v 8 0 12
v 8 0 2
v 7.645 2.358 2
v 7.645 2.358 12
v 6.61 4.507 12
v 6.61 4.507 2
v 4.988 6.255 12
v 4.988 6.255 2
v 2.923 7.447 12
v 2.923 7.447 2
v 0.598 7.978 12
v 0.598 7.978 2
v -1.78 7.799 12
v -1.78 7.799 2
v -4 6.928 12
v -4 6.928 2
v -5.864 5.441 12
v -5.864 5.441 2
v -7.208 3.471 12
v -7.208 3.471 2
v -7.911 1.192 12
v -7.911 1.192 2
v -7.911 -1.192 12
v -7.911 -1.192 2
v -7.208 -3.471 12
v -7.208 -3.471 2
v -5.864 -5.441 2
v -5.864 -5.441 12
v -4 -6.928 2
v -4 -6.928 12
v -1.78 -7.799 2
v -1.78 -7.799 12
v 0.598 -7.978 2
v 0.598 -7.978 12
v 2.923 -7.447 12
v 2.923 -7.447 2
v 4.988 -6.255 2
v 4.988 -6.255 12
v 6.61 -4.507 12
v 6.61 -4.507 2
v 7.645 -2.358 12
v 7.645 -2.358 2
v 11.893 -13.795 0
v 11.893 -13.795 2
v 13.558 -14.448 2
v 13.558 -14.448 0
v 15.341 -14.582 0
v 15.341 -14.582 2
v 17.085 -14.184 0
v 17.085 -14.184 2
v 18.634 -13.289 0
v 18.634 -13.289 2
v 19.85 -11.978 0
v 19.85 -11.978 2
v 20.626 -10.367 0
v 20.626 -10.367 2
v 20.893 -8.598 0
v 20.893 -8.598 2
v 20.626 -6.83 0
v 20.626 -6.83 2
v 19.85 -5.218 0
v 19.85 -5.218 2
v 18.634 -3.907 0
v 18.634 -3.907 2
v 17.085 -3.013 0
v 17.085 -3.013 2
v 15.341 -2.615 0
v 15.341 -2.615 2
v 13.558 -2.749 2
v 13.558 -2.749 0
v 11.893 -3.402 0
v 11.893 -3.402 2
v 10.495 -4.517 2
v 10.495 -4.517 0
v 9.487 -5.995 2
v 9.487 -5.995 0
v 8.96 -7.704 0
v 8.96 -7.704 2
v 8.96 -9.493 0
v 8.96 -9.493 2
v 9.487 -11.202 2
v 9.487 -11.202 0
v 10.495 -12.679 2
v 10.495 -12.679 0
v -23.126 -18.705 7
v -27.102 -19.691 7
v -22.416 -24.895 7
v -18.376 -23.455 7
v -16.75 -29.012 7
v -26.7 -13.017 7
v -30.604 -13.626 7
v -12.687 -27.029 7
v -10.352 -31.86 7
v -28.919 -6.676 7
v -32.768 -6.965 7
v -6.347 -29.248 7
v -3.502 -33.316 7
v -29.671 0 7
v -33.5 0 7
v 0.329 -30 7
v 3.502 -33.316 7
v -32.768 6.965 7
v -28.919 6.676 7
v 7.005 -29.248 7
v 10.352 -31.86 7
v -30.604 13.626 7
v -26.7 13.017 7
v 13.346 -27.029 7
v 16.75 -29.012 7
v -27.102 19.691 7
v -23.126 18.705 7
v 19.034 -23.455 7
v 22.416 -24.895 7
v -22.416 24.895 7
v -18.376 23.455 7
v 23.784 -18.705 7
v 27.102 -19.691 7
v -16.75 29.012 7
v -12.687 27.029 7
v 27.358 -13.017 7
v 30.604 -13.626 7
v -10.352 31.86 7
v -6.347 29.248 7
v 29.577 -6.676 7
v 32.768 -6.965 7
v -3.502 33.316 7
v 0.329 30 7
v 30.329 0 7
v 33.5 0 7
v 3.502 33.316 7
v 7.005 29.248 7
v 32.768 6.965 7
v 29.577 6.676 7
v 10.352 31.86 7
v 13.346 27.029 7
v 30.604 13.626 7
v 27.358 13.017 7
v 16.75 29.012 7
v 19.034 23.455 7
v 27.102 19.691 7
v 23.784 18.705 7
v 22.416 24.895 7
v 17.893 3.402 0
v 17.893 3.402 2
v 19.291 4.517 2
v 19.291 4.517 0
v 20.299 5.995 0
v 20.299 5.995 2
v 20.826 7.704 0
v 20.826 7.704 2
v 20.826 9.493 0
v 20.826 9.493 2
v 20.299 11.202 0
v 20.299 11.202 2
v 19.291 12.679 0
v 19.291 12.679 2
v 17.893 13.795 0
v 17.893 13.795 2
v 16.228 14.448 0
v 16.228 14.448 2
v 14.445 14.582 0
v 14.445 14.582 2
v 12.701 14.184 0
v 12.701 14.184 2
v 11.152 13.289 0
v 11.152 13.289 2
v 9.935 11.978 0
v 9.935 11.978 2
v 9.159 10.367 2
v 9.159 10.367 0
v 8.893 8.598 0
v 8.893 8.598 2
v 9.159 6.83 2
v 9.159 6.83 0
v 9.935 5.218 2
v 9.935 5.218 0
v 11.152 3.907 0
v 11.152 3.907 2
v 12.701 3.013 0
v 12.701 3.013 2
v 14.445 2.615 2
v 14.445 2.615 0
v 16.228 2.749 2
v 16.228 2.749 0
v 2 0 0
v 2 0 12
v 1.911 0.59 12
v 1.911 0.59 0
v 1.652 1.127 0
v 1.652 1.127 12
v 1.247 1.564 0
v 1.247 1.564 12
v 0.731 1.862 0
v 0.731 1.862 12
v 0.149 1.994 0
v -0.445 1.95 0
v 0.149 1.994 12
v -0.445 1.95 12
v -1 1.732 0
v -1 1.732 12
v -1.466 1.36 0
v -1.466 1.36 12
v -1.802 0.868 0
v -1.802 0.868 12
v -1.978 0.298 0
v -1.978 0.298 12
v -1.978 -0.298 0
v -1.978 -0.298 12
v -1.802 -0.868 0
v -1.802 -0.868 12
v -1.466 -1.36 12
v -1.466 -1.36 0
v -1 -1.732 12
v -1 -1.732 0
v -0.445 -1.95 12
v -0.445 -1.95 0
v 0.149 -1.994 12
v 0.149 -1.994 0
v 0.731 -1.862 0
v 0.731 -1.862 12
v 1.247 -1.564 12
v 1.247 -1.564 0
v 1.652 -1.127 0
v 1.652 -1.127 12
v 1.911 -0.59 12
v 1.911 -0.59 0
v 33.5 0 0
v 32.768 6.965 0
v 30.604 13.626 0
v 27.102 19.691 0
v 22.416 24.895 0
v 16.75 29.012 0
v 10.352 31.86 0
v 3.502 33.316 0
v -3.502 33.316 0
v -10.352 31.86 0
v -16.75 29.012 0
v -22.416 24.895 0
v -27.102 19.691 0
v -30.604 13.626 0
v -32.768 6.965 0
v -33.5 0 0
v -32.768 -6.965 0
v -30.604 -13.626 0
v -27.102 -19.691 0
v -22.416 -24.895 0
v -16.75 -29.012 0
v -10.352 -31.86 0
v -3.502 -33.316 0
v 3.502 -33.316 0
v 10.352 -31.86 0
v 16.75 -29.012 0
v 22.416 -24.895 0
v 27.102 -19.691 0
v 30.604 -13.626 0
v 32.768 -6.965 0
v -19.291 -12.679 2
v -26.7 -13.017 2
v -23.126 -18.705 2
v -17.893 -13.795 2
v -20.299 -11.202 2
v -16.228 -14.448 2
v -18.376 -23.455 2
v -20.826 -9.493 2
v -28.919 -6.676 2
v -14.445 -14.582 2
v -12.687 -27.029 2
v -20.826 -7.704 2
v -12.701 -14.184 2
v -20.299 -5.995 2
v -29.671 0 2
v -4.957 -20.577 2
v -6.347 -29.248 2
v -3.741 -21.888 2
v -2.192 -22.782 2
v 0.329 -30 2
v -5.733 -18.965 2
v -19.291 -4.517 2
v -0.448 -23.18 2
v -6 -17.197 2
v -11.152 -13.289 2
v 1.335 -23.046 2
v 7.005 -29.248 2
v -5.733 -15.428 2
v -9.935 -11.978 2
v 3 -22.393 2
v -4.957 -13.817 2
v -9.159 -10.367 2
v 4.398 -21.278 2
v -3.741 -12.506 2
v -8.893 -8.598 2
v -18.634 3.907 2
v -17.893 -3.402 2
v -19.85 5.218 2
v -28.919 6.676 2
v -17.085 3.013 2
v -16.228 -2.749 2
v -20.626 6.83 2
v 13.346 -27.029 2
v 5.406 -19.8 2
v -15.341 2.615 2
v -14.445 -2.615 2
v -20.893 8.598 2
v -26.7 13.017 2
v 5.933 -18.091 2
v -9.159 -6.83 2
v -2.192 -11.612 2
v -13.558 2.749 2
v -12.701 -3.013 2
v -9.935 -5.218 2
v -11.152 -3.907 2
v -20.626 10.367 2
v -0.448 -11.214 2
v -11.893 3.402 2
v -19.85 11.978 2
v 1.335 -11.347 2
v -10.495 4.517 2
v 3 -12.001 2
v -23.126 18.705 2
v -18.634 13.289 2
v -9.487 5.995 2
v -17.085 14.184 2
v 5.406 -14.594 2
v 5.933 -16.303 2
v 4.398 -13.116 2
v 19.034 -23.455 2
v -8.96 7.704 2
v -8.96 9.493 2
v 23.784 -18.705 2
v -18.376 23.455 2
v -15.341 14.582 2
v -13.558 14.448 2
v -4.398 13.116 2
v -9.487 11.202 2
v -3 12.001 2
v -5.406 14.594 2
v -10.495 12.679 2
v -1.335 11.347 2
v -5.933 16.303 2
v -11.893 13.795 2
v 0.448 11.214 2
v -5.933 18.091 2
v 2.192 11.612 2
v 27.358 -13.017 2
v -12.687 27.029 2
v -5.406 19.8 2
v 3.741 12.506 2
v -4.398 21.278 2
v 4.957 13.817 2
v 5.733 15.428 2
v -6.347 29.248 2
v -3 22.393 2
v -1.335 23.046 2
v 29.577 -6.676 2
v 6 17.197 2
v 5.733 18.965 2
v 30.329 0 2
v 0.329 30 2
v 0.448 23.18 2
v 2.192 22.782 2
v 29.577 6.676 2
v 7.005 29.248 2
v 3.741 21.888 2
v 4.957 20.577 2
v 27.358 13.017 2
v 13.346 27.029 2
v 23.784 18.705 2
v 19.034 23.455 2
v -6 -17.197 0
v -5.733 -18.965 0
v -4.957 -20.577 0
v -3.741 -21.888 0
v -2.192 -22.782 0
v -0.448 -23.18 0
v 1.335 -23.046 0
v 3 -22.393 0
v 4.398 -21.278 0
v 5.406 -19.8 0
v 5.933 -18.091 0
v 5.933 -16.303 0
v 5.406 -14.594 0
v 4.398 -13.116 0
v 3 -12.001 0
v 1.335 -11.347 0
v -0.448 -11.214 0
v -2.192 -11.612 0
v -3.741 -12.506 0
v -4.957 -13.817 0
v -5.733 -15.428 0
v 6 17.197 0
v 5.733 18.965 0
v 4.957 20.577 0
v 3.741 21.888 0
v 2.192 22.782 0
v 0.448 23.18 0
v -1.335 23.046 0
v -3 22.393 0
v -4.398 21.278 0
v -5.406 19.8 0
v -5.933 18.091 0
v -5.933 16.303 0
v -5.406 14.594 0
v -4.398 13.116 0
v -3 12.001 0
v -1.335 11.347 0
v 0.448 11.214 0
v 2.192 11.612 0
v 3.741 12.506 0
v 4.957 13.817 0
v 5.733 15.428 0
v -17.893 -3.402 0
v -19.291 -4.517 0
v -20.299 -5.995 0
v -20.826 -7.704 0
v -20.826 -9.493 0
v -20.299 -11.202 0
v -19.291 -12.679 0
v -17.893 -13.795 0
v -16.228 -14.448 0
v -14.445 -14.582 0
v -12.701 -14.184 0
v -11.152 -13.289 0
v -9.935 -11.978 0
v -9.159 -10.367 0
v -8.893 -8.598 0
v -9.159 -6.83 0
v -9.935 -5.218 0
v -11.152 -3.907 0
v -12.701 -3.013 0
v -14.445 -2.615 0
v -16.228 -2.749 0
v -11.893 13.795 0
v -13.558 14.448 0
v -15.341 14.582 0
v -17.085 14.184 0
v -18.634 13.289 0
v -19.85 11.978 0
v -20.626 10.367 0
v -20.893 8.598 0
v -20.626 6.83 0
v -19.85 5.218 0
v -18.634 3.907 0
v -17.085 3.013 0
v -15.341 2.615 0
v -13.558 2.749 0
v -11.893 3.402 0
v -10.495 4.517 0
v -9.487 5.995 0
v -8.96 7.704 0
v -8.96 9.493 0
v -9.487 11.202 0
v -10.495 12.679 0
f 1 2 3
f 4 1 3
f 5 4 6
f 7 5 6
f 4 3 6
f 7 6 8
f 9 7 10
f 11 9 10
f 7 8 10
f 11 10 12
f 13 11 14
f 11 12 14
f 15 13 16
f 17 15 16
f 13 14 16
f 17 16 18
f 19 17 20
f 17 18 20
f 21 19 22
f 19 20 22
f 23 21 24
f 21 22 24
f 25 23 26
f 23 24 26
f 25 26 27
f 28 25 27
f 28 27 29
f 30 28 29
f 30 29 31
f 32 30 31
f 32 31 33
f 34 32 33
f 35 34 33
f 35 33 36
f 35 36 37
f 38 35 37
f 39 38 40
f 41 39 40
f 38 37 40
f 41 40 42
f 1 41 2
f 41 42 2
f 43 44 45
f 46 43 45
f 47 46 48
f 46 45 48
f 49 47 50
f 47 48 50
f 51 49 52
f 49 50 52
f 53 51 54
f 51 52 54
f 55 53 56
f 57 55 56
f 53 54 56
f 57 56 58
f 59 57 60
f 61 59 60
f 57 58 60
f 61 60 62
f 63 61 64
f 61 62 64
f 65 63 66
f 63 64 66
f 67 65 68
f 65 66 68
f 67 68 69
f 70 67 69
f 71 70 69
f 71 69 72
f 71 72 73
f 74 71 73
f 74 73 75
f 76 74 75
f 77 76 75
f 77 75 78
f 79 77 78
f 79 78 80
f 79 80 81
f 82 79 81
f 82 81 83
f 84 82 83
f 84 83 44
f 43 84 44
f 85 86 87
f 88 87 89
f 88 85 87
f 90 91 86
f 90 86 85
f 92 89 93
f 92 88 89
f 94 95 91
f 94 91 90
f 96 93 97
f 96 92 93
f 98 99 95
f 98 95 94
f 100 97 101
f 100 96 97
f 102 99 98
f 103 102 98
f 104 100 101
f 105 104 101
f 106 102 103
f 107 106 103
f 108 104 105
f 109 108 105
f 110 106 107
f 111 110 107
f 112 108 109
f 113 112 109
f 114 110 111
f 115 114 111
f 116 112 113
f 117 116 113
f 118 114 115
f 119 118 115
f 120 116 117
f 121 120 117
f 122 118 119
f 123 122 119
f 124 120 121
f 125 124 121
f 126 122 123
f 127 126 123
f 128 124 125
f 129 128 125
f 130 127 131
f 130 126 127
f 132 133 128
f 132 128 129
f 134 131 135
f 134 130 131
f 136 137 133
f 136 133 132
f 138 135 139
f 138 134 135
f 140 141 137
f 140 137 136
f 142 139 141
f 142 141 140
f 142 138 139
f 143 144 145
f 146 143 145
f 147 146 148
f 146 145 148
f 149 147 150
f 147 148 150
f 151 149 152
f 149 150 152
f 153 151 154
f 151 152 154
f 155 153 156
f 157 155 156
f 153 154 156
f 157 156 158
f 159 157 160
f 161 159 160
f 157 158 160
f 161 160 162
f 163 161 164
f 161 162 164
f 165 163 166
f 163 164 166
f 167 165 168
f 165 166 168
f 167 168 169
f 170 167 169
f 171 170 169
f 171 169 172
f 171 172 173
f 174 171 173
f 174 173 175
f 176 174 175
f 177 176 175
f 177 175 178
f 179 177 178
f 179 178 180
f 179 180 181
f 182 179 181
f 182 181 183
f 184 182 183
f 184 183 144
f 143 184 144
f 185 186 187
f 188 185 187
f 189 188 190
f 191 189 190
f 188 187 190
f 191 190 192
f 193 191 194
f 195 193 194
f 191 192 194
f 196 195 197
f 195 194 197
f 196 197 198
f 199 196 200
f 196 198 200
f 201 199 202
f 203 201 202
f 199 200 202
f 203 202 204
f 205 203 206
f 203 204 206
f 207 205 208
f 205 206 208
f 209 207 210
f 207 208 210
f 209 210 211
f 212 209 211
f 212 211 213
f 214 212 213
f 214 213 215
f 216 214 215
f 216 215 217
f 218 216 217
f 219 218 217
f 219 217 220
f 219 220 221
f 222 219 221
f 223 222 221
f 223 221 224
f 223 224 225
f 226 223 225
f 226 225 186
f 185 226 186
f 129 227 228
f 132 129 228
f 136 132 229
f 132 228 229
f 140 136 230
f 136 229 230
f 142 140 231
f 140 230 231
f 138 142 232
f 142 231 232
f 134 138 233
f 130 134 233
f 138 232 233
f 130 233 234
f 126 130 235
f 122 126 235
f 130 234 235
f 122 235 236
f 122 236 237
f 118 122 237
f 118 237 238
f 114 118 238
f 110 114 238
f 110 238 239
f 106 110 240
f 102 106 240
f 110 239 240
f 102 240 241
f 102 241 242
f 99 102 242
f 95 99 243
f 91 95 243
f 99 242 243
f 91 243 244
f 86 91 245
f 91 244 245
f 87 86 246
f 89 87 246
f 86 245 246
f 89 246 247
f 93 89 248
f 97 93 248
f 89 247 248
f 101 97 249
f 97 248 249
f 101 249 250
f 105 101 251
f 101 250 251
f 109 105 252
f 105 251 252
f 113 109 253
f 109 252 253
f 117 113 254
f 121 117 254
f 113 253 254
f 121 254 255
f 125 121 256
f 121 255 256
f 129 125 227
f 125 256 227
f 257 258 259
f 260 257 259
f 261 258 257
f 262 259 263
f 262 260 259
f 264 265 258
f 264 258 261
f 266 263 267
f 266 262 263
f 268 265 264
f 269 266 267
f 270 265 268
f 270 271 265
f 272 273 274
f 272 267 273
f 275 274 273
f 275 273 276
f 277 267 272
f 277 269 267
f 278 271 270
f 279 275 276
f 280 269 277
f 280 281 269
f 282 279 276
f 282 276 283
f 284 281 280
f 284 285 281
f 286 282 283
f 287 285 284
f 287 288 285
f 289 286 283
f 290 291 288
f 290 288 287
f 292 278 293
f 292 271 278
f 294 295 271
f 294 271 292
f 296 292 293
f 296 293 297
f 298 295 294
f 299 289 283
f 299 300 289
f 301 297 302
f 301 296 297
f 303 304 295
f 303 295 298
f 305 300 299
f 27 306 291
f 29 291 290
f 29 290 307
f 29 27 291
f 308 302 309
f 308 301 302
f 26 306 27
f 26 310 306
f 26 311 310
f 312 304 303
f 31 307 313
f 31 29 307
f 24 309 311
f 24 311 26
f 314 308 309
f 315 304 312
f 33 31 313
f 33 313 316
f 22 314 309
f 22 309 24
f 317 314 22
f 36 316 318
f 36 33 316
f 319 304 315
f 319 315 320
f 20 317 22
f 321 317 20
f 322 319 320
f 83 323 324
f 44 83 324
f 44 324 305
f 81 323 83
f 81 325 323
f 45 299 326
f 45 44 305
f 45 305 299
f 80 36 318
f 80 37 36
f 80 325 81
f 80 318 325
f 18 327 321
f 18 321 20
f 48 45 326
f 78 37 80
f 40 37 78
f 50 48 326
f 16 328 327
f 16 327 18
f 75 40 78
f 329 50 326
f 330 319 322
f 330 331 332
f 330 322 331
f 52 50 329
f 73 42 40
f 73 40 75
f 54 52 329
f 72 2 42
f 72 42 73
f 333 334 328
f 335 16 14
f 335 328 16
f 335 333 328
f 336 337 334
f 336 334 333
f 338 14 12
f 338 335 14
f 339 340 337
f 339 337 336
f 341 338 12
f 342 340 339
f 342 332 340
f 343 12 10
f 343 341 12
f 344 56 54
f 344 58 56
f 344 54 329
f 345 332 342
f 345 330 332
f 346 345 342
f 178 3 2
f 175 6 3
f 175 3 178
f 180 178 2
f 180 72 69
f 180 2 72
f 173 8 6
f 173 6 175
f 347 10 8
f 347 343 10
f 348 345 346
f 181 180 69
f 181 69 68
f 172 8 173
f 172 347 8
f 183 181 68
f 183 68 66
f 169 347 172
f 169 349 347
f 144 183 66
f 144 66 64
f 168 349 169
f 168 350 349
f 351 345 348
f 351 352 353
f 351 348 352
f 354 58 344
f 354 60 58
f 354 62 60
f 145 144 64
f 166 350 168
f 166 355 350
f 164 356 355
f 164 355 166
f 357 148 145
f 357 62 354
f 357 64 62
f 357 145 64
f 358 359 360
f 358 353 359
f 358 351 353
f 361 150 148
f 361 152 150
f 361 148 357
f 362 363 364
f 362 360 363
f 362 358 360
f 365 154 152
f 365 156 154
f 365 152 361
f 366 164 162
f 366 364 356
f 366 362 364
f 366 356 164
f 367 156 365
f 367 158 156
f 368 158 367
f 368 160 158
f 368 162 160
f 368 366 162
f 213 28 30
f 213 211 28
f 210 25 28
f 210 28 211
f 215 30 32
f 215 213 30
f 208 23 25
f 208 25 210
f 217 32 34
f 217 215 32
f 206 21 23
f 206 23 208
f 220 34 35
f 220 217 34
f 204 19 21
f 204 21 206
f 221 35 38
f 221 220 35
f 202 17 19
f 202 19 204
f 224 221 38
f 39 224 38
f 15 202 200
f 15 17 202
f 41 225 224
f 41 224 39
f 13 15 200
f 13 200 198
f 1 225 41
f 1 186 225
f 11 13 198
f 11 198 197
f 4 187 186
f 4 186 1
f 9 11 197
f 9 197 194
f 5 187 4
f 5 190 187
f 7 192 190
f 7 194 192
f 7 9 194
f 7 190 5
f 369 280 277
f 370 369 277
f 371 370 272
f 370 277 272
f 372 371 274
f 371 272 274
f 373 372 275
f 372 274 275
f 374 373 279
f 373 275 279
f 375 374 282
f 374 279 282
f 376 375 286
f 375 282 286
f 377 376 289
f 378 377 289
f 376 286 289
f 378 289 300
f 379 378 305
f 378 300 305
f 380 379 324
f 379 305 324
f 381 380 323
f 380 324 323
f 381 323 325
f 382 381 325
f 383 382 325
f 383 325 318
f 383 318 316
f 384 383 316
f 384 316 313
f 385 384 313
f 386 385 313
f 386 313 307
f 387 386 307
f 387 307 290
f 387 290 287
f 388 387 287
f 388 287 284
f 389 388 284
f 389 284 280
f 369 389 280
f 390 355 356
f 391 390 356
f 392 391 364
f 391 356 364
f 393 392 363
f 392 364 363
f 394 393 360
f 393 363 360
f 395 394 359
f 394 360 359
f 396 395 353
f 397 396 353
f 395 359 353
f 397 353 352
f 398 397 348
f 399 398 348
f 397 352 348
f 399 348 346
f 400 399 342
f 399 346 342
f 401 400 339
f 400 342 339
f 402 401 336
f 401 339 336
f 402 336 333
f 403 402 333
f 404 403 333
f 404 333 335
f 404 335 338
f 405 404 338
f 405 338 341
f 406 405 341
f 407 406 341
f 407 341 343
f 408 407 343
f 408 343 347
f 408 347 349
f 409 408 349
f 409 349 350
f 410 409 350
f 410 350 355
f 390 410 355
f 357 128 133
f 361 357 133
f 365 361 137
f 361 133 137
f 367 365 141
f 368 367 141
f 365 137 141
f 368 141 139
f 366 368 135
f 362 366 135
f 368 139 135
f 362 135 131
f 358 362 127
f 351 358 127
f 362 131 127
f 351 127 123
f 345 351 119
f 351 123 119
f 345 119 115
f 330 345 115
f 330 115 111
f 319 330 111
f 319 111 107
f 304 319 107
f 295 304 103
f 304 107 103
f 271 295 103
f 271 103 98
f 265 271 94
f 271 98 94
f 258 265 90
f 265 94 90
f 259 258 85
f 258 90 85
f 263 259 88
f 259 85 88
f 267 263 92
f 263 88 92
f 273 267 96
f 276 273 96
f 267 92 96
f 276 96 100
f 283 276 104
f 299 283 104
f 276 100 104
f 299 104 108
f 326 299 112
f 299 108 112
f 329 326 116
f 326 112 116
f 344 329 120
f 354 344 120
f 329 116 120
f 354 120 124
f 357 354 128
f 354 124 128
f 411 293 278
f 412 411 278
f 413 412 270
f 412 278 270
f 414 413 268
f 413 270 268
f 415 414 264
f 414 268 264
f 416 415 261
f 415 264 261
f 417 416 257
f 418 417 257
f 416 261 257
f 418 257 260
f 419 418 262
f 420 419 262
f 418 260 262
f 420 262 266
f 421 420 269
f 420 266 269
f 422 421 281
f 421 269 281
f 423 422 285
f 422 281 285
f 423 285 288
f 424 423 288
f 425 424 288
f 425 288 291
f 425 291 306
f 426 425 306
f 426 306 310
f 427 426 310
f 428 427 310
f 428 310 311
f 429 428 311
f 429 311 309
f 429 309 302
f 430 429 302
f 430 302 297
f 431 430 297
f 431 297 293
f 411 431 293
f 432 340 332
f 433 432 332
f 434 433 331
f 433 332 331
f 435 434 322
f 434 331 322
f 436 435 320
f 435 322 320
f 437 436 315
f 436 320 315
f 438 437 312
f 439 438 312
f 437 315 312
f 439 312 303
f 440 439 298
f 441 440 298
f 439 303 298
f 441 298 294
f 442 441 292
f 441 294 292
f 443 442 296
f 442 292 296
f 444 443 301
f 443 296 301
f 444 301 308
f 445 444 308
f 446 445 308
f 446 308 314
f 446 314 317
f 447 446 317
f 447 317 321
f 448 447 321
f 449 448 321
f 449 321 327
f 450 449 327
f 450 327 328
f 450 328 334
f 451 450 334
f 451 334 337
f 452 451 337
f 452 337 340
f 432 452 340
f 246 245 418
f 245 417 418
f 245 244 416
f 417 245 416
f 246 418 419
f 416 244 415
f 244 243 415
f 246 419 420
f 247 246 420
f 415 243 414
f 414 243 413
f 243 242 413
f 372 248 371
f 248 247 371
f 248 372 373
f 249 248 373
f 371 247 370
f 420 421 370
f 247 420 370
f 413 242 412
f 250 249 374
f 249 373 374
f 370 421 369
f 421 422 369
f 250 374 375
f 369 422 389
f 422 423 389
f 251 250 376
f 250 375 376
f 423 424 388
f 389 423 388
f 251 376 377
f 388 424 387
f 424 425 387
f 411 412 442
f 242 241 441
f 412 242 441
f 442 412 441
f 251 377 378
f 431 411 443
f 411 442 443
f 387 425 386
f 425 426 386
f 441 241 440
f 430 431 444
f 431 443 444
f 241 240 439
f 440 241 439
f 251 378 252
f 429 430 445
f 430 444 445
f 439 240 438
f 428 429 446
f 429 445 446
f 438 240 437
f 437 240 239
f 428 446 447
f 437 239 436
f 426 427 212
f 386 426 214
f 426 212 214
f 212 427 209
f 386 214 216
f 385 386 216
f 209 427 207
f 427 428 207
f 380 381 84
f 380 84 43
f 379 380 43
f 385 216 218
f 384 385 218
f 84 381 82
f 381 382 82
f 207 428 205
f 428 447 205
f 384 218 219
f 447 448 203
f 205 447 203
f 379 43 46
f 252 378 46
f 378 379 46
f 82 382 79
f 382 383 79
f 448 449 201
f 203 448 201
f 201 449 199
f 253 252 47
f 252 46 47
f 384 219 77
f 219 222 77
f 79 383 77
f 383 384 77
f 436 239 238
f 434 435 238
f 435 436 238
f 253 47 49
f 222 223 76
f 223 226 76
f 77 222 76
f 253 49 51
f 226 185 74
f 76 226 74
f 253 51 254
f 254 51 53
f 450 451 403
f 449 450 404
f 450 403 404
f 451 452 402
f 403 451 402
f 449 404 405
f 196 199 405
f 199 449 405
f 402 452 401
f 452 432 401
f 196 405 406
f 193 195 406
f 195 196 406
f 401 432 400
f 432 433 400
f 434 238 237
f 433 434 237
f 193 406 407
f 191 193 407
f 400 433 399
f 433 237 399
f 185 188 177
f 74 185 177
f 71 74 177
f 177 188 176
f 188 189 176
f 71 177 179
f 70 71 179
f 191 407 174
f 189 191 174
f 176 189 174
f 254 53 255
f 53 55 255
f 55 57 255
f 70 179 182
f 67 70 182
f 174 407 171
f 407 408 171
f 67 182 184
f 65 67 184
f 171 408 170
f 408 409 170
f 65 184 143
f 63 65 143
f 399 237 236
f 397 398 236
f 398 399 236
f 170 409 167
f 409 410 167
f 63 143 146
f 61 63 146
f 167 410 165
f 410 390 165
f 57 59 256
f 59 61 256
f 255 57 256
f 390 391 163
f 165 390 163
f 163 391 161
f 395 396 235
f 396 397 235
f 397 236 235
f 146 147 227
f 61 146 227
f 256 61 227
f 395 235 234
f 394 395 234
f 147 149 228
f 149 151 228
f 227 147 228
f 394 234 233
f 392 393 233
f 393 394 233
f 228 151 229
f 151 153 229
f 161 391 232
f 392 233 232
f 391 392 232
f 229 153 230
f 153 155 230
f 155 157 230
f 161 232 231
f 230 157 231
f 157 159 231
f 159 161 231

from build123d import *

# Parameters (mm, degrees)
SKETCH1_R           = 33.5
BOSS_EXTRUDE1_DEPTH = 7
SKETCH2_R           = 30
CUT_EXTRUDE1_DEPTH  = 5
SKETCH3_R           = 8
BOSS_EXTRUDE2_DEPTH = 10
SKETCH4_R           = 2
CUT_EXTRUDE2_DEPTH  = 30
SKETCH5_R           = 6
CUT_EXTRUDE3_DEPTH  = 3
CIRPATTERN1_COUNT   = 6


with BuildPart() as part:
    # Sketch1 → Boss-Extrude1 (new body)
    with BuildSketch(Plane.XY):
        Circle(SKETCH1_R)
    extrude(amount=BOSS_EXTRUDE1_DEPTH)

    # Sketch2 → Cut-Extrude1 (cut)
    with BuildSketch(Plane.XY.offset(7)):
        with Locations((0.329125808, 0)):
            Circle(SKETCH2_R)
    extrude(amount=-CUT_EXTRUDE1_DEPTH, mode=Mode.SUBTRACT)

    # Sketch3 → Boss-Extrude2 (add)
    with BuildSketch(Plane.XY.offset(2)):
        Circle(SKETCH3_R)
    extrude(amount=BOSS_EXTRUDE2_DEPTH)

    # Sketch4 → Cut-Extrude2 (cut)
    with BuildSketch(Plane.XY.offset(12)):
        Circle(SKETCH4_R)
    extrude(amount=-CUT_EXTRUDE2_DEPTH, mode=Mode.SUBTRACT)

    # Sketch5 → Cut-Extrude3 (cut, through all)
    with BuildSketch(Plane.XY.offset(2)):
        with Locations((0, 17.196823471)):
            Circle(SKETCH5_R)
    cut_extrude3 = extrude(amount=-CUT_EXTRUDE3_DEPTH, mode=Mode.SUBTRACT)

    # CirPattern1: Cut-Extrude3 ×6 about axis
    cirpattern1_axis = Axis((0, 0, 0), (0, 0, 1))
    for i in range(1, CIRPATTERN1_COUNT):
        add(cut_extrude3.rotate(cirpattern1_axis, i * 360 / CIRPATTERN1_COUNT), mode=Mode.SUBTRACT)


solid = part.part
